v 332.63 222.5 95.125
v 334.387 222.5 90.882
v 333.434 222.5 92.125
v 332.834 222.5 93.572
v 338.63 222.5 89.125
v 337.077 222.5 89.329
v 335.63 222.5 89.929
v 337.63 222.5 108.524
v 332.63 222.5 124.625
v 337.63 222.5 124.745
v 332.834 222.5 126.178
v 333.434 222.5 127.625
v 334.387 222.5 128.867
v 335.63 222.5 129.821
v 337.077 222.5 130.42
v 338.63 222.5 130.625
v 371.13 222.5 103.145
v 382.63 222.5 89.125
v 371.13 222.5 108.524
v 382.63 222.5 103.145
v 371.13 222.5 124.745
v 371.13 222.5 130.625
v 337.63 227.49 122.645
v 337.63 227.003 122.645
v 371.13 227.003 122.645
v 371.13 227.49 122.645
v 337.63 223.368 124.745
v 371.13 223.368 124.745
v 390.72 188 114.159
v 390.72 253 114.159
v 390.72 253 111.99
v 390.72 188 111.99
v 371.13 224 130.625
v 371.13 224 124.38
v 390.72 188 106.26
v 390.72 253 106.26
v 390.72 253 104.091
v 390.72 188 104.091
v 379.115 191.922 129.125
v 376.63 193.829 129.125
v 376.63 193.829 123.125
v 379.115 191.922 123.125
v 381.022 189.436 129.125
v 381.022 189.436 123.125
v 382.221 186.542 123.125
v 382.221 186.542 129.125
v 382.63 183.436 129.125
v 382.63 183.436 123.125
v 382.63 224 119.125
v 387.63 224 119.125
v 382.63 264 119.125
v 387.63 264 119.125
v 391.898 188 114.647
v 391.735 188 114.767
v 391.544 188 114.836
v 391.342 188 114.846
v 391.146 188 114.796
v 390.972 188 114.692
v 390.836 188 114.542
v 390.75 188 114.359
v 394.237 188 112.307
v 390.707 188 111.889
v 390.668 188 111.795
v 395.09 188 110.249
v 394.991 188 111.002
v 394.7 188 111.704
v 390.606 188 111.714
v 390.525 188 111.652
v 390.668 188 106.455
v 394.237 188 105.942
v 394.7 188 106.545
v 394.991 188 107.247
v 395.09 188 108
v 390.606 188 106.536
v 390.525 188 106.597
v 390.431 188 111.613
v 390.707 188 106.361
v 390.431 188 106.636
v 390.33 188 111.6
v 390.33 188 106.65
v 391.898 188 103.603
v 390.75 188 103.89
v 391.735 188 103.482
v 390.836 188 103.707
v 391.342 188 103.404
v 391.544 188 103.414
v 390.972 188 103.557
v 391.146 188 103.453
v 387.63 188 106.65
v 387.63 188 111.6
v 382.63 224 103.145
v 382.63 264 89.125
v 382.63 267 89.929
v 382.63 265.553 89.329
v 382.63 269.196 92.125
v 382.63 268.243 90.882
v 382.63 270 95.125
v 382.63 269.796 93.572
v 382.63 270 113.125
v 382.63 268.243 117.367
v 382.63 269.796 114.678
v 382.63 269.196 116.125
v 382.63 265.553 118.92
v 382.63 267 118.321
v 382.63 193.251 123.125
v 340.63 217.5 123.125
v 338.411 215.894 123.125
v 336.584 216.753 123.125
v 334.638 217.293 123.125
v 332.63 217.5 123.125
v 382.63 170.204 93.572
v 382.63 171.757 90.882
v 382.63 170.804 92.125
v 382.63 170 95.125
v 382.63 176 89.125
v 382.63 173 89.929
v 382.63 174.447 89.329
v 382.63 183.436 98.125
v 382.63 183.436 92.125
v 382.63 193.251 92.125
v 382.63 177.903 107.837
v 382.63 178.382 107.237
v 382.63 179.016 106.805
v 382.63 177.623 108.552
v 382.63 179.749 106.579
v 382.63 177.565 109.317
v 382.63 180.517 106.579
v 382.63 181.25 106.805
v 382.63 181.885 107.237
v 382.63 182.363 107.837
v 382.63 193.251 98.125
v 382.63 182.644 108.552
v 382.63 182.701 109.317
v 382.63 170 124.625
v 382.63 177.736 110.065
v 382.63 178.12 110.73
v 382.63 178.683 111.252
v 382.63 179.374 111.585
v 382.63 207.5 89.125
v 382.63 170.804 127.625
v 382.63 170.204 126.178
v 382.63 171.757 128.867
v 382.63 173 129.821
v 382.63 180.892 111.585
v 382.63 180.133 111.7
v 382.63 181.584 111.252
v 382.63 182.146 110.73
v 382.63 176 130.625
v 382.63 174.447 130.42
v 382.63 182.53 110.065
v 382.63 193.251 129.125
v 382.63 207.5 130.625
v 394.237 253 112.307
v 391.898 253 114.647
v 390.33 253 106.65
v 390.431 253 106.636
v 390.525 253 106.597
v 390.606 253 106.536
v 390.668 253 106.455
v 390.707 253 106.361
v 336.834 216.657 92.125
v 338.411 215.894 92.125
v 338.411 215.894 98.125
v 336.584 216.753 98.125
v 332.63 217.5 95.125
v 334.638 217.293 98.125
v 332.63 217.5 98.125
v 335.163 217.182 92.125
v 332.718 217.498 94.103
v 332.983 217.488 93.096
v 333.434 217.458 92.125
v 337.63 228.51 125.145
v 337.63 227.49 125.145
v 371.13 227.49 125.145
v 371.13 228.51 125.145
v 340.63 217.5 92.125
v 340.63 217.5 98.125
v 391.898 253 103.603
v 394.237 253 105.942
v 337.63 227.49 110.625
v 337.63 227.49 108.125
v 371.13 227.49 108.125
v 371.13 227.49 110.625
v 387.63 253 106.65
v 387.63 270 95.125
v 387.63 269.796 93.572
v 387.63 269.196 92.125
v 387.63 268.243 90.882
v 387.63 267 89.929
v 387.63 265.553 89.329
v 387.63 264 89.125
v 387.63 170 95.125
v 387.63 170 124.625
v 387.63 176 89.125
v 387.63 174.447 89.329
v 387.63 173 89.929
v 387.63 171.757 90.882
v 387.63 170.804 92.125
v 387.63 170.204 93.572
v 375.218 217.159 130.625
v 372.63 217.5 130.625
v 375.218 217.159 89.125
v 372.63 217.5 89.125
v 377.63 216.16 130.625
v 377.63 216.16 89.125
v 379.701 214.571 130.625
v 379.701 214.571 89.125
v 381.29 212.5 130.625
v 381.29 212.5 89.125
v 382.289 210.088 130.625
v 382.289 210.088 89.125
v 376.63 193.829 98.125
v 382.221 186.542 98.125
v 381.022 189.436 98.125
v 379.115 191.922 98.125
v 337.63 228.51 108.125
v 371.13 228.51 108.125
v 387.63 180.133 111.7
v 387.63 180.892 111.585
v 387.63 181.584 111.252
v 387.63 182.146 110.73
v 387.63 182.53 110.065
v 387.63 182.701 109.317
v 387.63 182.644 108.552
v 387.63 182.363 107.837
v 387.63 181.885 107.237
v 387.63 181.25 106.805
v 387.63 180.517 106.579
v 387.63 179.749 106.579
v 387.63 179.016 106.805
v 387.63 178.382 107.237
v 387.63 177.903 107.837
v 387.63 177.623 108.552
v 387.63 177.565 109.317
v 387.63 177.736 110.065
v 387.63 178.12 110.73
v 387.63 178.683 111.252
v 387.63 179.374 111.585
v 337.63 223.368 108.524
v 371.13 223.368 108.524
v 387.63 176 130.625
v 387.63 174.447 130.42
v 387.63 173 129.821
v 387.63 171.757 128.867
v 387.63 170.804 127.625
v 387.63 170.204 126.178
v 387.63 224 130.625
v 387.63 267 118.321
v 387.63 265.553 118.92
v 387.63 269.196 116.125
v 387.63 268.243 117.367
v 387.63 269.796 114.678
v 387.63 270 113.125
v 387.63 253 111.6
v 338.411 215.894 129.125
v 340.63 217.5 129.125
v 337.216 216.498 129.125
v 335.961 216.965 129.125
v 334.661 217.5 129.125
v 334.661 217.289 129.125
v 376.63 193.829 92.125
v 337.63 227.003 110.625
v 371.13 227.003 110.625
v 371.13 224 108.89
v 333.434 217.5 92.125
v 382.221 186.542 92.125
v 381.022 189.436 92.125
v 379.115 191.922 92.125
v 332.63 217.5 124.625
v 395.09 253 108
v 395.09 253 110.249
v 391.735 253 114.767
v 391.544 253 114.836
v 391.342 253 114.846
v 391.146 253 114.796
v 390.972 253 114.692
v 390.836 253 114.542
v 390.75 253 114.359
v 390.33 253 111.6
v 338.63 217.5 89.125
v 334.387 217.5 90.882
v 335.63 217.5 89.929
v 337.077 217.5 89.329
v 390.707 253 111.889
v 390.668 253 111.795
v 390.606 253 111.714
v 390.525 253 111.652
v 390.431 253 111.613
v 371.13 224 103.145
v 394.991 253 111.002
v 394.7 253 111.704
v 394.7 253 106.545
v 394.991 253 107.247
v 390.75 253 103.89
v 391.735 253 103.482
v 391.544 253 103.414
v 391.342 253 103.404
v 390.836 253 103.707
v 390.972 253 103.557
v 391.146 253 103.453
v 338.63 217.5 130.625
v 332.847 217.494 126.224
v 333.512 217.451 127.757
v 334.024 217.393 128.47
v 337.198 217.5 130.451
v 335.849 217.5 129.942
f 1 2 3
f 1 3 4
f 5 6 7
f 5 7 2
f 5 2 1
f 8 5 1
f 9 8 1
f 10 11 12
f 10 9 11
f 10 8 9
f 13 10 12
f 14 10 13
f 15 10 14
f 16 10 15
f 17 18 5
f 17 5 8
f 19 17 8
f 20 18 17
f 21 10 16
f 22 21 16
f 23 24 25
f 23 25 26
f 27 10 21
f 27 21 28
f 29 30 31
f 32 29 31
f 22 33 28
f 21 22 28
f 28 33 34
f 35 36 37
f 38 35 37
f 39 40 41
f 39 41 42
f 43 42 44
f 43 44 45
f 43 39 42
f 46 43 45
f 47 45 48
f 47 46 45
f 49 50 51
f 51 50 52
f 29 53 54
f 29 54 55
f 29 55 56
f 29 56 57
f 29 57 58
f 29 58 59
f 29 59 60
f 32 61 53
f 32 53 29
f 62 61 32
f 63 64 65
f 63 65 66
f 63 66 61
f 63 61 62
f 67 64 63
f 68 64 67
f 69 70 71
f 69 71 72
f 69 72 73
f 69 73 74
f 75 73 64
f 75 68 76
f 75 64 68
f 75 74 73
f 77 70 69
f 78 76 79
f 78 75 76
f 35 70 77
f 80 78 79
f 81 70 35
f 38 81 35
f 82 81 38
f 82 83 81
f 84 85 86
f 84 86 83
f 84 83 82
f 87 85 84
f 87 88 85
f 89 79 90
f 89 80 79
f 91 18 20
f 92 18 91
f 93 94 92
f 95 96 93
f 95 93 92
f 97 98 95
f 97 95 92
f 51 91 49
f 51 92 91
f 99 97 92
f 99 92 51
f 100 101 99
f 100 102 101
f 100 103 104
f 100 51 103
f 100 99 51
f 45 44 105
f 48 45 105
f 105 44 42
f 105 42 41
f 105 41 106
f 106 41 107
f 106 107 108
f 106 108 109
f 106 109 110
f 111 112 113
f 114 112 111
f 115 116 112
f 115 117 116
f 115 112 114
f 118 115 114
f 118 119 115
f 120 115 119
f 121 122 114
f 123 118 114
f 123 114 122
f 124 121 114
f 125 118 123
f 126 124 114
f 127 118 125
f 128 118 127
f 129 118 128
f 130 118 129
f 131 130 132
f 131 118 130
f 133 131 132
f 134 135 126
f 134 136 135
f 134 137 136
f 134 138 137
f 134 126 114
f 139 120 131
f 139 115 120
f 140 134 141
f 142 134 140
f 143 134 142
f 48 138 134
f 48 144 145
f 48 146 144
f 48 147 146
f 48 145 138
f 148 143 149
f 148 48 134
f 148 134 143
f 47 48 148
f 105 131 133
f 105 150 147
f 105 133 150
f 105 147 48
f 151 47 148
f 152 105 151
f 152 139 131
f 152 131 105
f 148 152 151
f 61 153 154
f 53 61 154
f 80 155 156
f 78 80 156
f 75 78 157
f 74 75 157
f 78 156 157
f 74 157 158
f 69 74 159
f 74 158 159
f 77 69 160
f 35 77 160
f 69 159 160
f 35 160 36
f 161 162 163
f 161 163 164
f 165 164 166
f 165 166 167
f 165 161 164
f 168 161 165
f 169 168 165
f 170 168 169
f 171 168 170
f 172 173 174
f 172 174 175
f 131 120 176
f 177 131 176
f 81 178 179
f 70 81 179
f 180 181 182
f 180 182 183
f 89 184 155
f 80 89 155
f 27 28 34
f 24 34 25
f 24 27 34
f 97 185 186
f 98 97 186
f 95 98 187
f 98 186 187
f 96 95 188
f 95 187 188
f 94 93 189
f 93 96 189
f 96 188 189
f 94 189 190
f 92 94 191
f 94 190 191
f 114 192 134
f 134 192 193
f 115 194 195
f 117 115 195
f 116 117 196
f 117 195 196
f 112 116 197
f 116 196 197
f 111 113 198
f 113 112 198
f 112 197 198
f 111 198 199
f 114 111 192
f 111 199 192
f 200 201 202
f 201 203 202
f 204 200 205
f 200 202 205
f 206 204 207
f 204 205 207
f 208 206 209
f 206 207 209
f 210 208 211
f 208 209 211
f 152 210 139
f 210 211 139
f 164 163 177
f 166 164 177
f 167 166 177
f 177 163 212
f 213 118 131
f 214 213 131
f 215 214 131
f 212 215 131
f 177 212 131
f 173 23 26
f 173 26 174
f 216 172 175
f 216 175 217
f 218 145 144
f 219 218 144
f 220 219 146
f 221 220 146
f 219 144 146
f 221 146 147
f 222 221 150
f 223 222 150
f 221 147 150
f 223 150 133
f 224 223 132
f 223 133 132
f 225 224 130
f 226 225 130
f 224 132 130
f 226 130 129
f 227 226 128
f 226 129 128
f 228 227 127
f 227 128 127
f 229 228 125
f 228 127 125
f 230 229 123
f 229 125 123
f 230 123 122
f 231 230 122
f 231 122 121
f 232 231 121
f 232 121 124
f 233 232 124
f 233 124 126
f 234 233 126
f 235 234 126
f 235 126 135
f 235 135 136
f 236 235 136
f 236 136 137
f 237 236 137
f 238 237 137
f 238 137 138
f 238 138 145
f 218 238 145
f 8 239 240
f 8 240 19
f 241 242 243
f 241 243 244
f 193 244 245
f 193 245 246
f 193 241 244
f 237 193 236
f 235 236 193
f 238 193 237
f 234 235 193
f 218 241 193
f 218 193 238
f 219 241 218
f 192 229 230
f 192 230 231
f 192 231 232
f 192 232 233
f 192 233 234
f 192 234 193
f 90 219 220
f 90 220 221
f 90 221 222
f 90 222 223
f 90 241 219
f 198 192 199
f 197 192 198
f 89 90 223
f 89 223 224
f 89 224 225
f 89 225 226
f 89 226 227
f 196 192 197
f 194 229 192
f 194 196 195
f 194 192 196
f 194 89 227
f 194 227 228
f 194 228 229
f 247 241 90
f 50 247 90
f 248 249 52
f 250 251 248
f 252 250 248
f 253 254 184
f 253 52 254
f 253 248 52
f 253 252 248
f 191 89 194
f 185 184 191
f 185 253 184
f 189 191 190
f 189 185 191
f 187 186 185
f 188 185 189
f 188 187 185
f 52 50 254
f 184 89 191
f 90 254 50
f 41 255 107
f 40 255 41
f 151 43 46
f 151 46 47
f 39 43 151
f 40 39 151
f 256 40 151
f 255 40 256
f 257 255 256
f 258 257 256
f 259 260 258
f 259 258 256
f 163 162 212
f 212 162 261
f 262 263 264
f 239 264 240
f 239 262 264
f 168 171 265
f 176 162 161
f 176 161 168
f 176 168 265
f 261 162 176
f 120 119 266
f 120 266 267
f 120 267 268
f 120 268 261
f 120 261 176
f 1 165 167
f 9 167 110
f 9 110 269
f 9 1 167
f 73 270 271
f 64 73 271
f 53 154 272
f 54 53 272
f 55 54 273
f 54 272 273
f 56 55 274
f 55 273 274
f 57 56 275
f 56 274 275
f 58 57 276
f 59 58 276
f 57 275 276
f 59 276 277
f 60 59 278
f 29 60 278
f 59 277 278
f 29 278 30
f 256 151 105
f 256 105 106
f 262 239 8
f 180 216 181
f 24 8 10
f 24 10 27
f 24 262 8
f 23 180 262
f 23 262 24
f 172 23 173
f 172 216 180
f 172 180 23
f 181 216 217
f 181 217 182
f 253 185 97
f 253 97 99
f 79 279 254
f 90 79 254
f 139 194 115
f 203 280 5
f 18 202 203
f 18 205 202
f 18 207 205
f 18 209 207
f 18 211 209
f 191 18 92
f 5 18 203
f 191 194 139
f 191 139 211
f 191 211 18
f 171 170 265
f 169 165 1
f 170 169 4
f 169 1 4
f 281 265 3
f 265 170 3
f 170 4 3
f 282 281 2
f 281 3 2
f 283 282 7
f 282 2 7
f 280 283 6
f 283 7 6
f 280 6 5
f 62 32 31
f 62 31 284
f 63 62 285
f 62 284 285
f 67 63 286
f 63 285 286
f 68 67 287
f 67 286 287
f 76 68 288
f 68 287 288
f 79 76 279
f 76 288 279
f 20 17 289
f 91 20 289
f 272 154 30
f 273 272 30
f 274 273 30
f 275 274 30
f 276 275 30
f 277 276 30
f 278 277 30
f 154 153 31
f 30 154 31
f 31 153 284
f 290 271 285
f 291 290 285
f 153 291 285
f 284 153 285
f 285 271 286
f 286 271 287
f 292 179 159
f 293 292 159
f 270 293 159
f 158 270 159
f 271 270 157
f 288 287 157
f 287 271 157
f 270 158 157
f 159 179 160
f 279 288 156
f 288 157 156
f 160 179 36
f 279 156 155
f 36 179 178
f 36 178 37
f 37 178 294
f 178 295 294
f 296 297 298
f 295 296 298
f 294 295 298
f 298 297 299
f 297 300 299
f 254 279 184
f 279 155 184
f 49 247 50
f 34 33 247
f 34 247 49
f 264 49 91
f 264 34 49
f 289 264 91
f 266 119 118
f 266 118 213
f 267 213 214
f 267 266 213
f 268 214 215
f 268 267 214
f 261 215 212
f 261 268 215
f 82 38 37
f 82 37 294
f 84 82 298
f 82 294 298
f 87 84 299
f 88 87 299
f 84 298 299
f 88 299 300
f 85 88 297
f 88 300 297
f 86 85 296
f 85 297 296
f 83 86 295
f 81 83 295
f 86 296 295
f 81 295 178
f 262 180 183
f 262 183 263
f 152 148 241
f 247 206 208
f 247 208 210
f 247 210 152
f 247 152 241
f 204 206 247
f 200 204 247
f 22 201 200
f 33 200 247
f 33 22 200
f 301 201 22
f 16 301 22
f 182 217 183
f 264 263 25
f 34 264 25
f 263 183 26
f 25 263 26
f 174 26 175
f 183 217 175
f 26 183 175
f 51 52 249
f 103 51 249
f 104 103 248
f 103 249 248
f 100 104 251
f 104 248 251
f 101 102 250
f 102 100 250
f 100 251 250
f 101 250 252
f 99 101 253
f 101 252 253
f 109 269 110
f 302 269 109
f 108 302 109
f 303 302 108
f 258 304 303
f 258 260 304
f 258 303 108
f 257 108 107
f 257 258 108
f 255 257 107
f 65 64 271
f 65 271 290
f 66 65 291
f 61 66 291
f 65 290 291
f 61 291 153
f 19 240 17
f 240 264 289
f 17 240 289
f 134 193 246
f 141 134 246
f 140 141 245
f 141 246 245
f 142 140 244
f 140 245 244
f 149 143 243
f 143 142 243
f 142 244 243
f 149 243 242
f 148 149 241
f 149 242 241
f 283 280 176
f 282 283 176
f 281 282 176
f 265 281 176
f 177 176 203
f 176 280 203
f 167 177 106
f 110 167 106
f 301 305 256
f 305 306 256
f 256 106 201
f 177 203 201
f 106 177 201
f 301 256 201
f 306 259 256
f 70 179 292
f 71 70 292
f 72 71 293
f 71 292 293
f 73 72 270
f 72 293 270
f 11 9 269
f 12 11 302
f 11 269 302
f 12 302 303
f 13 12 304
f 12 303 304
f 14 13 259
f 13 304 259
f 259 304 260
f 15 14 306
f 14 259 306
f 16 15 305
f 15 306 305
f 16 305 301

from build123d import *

# Parameters (mm, degrees)
BOSS_EXTRUDE5_DEPTH  = 50
SKETCH11_W           = 41.5
SKETCH11_H           = 100
BOSS_EXTRUDE6_DEPTH  = 5
SKETCH12_W           = 41.5
SKETCH12_H           = 5
BOSS_EXTRUDE8_DEPTH  = 55
SKETCH13_W           = 11.5
SKETCH13_H           = 47.5
CUT_EXTRUDE1_DEPTH   = 55
BOSS_EXTRUDE9_DEPTH  = 6
FILLET7_R            = 12
FILLET7_OF_MIRROR1_R = 12
FILLET8_R            = 6
BOSS_EXTRUDE10_START = 8
BOSS_EXTRUDE10_DEPTH = 8
FILLET12_R           = 10
BOSS_EXTRUDE11_DEPTH = 57
SKETCH16_R           = 2.575
CUT_EXTRUDE2_DEPTH   = 10
SKETCH17_W           = 27.480150942
SKETCH17_H           = 1.5
BOSS_EXTRUDE12_DEPTH = 11.5
SKETCH18_W           = 11.5
SKETCH18_H           = 1.5
BOSS_EXTRUDE13_DEPTH = 5
BOSS_EXTRUDE14_START = -5
BOSS_EXTRUDE14_DEPTH = 33.5


with BuildPart() as part:
    # Sketch9 → Boss-Extrude5 (new body)
    with BuildSketch(Plane(origin=(0, 245, 0), x_dir=(1, 0, 0), z_dir=(0, 1, 0))):
        with BuildLine():
            Line((389.629800237, -111.599739584), (387.629800237, -111.599739584))
            Line((387.629800237, -111.599739584), (387.629800237, -106.649739584))
            Line((387.629800237, -106.649739584), (389.629800237, -106.649739584))
            Line((389.629800237, -106.649739584), (390.329799474, -106.649739584))
            ThreePointArc((390.329799474, -106.649739584), (390.605571069, -106.535511279), (390.719799474, -106.259739725))
            Line((390.719799474, -106.259739725), (390.719800256, -104.090618139))
            ThreePointArc((390.719800256, -104.090618139), (391.145748802, -103.453141463), (391.897703935, -103.602714709))
            Line((391.897703935, -103.602714709), (394.237480965, -105.942491739))
            ThreePointArc((394.237480965, -105.942491739), (394.868289671, -106.886563682), (395.089800232, -108.000172467))
            Line((395.089800232, -108.000172467), (395.089800237, -110.249306685))
            ThreePointArc((395.089800237, -110.249306685), (394.868289678, -111.362915477), (394.23748097, -112.306987424))
            Line((394.23748097, -112.306987424), (391.897703941, -114.646764454))
            ThreePointArc((391.897703941, -114.646764454), (391.145748809, -114.7963377), (390.719800262, -114.158861025))
            Line((390.719800262, -114.158861025), (390.719799474, -111.989739443))
            ThreePointArc((390.719799474, -111.989739443), (390.605571069, -111.71396789), (390.329799474, -111.599739584))
            Line((390.329799474, -111.599739584), (389.629800237, -111.599739584))
        make_face()
    extrude(amount=-BOSS_EXTRUDE5_DEPTH)

    # Sketch11 → Boss-Extrude6 (add)
    with BuildSketch(Plane.ZY.offset(-387.629800242)):
        with Locations((109.874739584, 220)):
            Rectangle(SKETCH11_W, SKETCH11_H)
    extrude(amount=BOSS_EXTRUDE6_DEPTH)

    # Sketch12 → Boss-Extrude8 (add)
    with BuildSketch(Plane.ZY.offset(-387.629800242)):
        with Locations((109.874739584, 220)):
            Rectangle(SKETCH12_W, SKETCH12_H)
    extrude(amount=BOSS_EXTRUDE8_DEPTH)

    # Sketch13 → Cut-Extrude1 (cut)
    with BuildSketch(Plane.ZY.offset(-387.629800242)):
        with Locations((124.874739584, 246.25)):
            Rectangle(SKETCH13_W, SKETCH13_H)
    extrude(amount=CUT_EXTRUDE1_DEPTH, mode=Mode.SUBTRACT)

    # Sketch15 → Boss-Extrude9 (add)
    with BuildSketch(Plane.XY.offset(129.124739584)):
        Polygon((335.629800242, 217.5), (382.629800242, 190.364537348), (382.629800242, 193.251288694), (340.629800242, 217.5), align=None)
    boss_extrude9 = extrude(amount=-BOSS_EXTRUDE9_DEPTH)

    # Fillet7
    # the kernel refuses this fillet: 12 mm, written as the material it adds along each edge
    with BuildSketch(Plane(origin=(335.629800242, 217.5, 129.124739584), x_dir=(-1, 0, 0), z_dir=(0, 0, -1))) as fillet7_piece_1:
        with BuildLine():
            CenterArc((3.218847051, -11.998004249), FILLET7_R, 91.044975628, 28.955024372)
            Line((-2.781152949, -1.605699404), (-2.901152949, -1.397853307))
            Line((-2.901152949, -1.397853307), (-0.12, 0.207846097))
            Line((-0.12, 0.207846097), (0, 0.24))
            ThreePointArc((0, 0.24), (1.5, 0.24), (2.995623059, 0.239960085))
            Line((2.995623059, 0.239960085), (3, 0))
        make_face()
    extrude(amount=6)
    with BuildSketch(Plane(origin=(382.629800242, 190.364537348, 129.124739584), x_dir=(0, -1, 0), z_dir=(0, 0, -1))) as fillet7_piece_2:
        with BuildLine():
            CenterArc((FILLET7_R * 0.57735026919, FILLET7_R), FILLET7_R, 210, 60)
            Line((-FILLET7_R * 0.288675134595, FILLET7_R * 0.5), (-FILLET7_R * 0.305995642671, FILLET7_R * 0.49))
            Line((-FILLET7_R * 0.305995642671, FILLET7_R * 0.49), (-FILLET7_R * 0.0115470053838, -FILLET7_R * 0.02))
            Line((-FILLET7_R * 0.0115470053838, -FILLET7_R * 0.02), (FILLET7_R * 0.57735026919, -FILLET7_R * 0.02))
            Line((FILLET7_R * 0.57735026919, -FILLET7_R * 0.02), (FILLET7_R * 0.57735026919, 0))
        make_face()
    extrude(amount=6)

    # Mirror1: Boss-Extrude9 across plane
    add(boss_extrude9.mirror(Plane.XY.offset(110.624739584)))

    # Fillet7 of Mirror1
    # the kernel refuses this fillet: 12 mm, written as the material it adds along each edge
    with BuildSketch(Plane(origin=(335.629800242, 217.5, 92.124739584), x_dir=(-1, 0, 0), z_dir=(0, 0, 1))) as fillet7_of_mirror1_piece_1:
        with BuildLine():
            CenterArc((3.218847051, 11.998004249), FILLET7_OF_MIRROR1_R, 240, 28.955024372)
            Line((-2.781152949, 1.605699404), (-2.901152949, 1.397853307))
            Line((-2.901152949, 1.397853307), (-0.12, -0.207846097))
            Line((-0.12, -0.207846097), (0, -0.24))
            ThreePointArc((0, -0.24), (1.5, -0.24), (2.995623059, -0.239960085))
            Line((2.995623059, -0.239960085), (3, 0))
        make_face()
    extrude(amount=6)
    with BuildSketch(Plane(origin=(382.629800242, 190.364537348, 92.124739584), x_dir=(0, -1, 0), z_dir=(0, 0, 1))) as fillet7_of_mirror1_piece_2:
        with BuildLine():
            CenterArc((FILLET7_OF_MIRROR1_R * 0.57735026919, -FILLET7_OF_MIRROR1_R), FILLET7_OF_MIRROR1_R, 90, 60)
            Line((-FILLET7_OF_MIRROR1_R * 0.288675134595, -FILLET7_OF_MIRROR1_R * 0.5), (-FILLET7_OF_MIRROR1_R * 0.305995642671, -FILLET7_OF_MIRROR1_R * 0.49))
            Line((-FILLET7_OF_MIRROR1_R * 0.305995642671, -FILLET7_OF_MIRROR1_R * 0.49), (-FILLET7_OF_MIRROR1_R * 0.0115470053838, FILLET7_OF_MIRROR1_R * 0.02))
            Line((-FILLET7_OF_MIRROR1_R * 0.0115470053838, FILLET7_OF_MIRROR1_R * 0.02), (FILLET7_OF_MIRROR1_R * 0.57735026919, FILLET7_OF_MIRROR1_R * 0.02))
            Line((FILLET7_OF_MIRROR1_R * 0.57735026919, FILLET7_OF_MIRROR1_R * 0.02), (FILLET7_OF_MIRROR1_R * 0.57735026919, 0))
        make_face()
    extrude(amount=6)

    # Fillet8
    # the kernel refuses this fillet: 6 mm, written as the material it takes off along each edge
    with BuildSketch(Plane(origin=(402.629800242, 270, 89.124739584), x_dir=(0, 0, 1), z_dir=(-1, 0, 0)), Plane(origin=(332.629800242, 237.5, 89.124739584), x_dir=(0, 0, 1), z_dir=(0, -1, 0)), Plane(origin=(402.629800242, 270, 119.124739584), x_dir=(0, -1, 0), z_dir=(-1, 0, 0))) as fillet8_piece_1:
        with BuildLine():
            CenterArc((FILLET8_R, -FILLET8_R), FILLET8_R, 90, 90)
            Line((0, -FILLET8_R), (0, 0))
            Line((0, 0), (FILLET8_R, 0))
        make_face()
    extrude(amount=35, mode=Mode.SUBTRACT)
    with BuildSketch(Plane(origin=(402.629800242, 170, 89.124739584), x_dir=(0, 0, 1), z_dir=(-1, 0, 0)), Plane(origin=(402.629800242, 170, 130.624739584), x_dir=(0, 1, 0), z_dir=(-1, 0, 0)), Plane(origin=(332.629800242, 202.5, 130.624739584), x_dir=(1, 0, 0), z_dir=(0, 1, 0))) as fillet8_piece_2:
        with BuildLine():
            CenterArc((FILLET8_R, FILLET8_R), FILLET8_R, 180, 90)
            Line((0, FILLET8_R), (0, 0))
            Line((0, 0), (FILLET8_R, 0))
        make_face()
    extrude(amount=35, mode=Mode.SUBTRACT)

    # Sketch9<2> → Boss-Extrude10 (add)
    with BuildSketch(Plane(origin=(0, 245, 0), x_dir=(1, 0, 0), z_dir=(0, 1, 0)).offset(BOSS_EXTRUDE10_START)):
        with BuildLine():
            Line((389.629800237, -111.599739584), (387.629800237, -111.599739584))
            Line((387.629800237, -111.599739584), (387.629800237, -106.649739584))
            Line((387.629800237, -106.649739584), (389.629800237, -106.649739584))
            Line((389.629800237, -106.649739584), (390.329799474, -106.649739584))
            ThreePointArc((390.329799474, -106.649739584), (390.605571069, -106.535511279), (390.719799474, -106.259739725))
            Line((390.719799474, -106.259739725), (390.719800256, -104.090618139))
            ThreePointArc((390.719800256, -104.090618139), (391.145748802, -103.453141463), (391.897703935, -103.602714709))
            Line((391.897703935, -103.602714709), (394.237480965, -105.942491739))
            ThreePointArc((394.237480965, -105.942491739), (394.868289671, -106.886563682), (395.089800232, -108.000172467))
            Line((395.089800232, -108.000172467), (395.089800237, -110.249306685))
            ThreePointArc((395.089800237, -110.249306685), (394.868289678, -111.362915477), (394.23748097, -112.306987424))
            Line((394.23748097, -112.306987424), (391.897703941, -114.646764454))
            ThreePointArc((391.897703941, -114.646764454), (391.145748809, -114.7963377), (390.719800262, -114.158861025))
            Line((390.719800262, -114.158861025), (390.719799474, -111.989739443))
            ThreePointArc((390.719799474, -111.989739443), (390.605571069, -111.71396789), (390.329799474, -111.599739584))
            Line((390.329799474, -111.599739584), (389.629800237, -111.599739584))
        make_face()
    extrude(amount=-BOSS_EXTRUDE10_DEPTH)

    # Fillet12
    fillet12_edges = [part.edges().sort_by_distance(p)[0] for p in [
        (382.629800242, 217.5, 109.874739584),
    ]]
    fillet(fillet12_edges, radius=FILLET12_R)

    # Sketch9<3> → Boss-Extrude11 (add)
    with BuildSketch(Plane(origin=(0, 245, 0), x_dir=(1, 0, 0), z_dir=(0, 1, 0))):
        with BuildLine():
            Line((389.629800237, -111.599739584), (387.629800237, -111.599739584))
            Line((387.629800237, -111.599739584), (387.629800237, -106.649739584))
            Line((387.629800237, -106.649739584), (389.629800237, -106.649739584))
            Line((389.629800237, -106.649739584), (390.329799474, -106.649739584))
            ThreePointArc((390.329799474, -106.649739584), (390.605571069, -106.535511279), (390.719799474, -106.259739725))
            Line((390.719799474, -106.259739725), (390.719800256, -104.090618139))
            ThreePointArc((390.719800256, -104.090618139), (391.145748802, -103.453141463), (391.897703935, -103.602714709))
            Line((391.897703935, -103.602714709), (394.237480965, -105.942491739))
            ThreePointArc((394.237480965, -105.942491739), (394.868289671, -106.886563682), (395.089800232, -108.000172467))
            Line((395.089800232, -108.000172467), (395.089800237, -110.249306685))
            ThreePointArc((395.089800237, -110.249306685), (394.868289678, -111.362915477), (394.23748097, -112.306987424))
            Line((394.23748097, -112.306987424), (391.897703941, -114.646764454))
            ThreePointArc((391.897703941, -114.646764454), (391.145748809, -114.7963377), (390.719800262, -114.158861025))
            Line((390.719800262, -114.158861025), (390.719799474, -111.989739443))
            ThreePointArc((390.719799474, -111.989739443), (390.605571069, -111.71396789), (390.329799474, -111.599739584))
            Line((390.329799474, -111.599739584), (389.629800237, -111.599739584))
        make_face()
    extrude(amount=-BOSS_EXTRUDE11_DEPTH)

    # Sketch16 → Cut-Extrude2 (cut)
    with BuildSketch(Plane.ZY.offset(-382.629800242)):
        with Locations((109.124739584, 180.133064736)):
            Circle(SKETCH16_R)
    extrude(amount=-CUT_EXTRUDE2_DEPTH, mode=Mode.SUBTRACT)

    # Sketch17 → Boss-Extrude12 (add)
    with BuildSketch(Plane(origin=(371.129800242, 0, 0), x_dir=(0, 0, -1), z_dir=(1, 0, 0))):
        with Locations((-116.884664113, 223.25)):
            Rectangle(SKETCH17_W, SKETCH17_H)
    extrude(amount=BOSS_EXTRUDE12_DEPTH)

    # Sketch18 → Boss-Extrude13 (add)
    with BuildSketch(Plane(origin=(382.629800242, 0, 0), x_dir=(0, 0, -1), z_dir=(1, 0, 0))):
        with Locations((-124.874739584, 223.25)):
            Rectangle(SKETCH18_W, SKETCH18_H)
    extrude(amount=BOSS_EXTRUDE13_DEPTH)

    # Sketch19 → Boss-Extrude14 (add)
    with BuildSketch(Plane.ZY.offset(-332.629800242).offset(BOSS_EXTRUDE14_START)):
        Polygon((125.144664113, 227.49), (125.144664113, 228.51), (108.124664113, 228.51), (108.124664113, 227.49), (110.624664113, 227.49), (110.624664113, 227.002681543), (108.524291386, 223.367942117), (108.524291386, 222.5), (124.745036841, 222.5), (124.745036841, 223.367942117), (122.644664113, 227.002681543), (122.644664113, 227.49), align=None)
    extrude(amount=-BOSS_EXTRUDE14_DEPTH)


solid = part.part
